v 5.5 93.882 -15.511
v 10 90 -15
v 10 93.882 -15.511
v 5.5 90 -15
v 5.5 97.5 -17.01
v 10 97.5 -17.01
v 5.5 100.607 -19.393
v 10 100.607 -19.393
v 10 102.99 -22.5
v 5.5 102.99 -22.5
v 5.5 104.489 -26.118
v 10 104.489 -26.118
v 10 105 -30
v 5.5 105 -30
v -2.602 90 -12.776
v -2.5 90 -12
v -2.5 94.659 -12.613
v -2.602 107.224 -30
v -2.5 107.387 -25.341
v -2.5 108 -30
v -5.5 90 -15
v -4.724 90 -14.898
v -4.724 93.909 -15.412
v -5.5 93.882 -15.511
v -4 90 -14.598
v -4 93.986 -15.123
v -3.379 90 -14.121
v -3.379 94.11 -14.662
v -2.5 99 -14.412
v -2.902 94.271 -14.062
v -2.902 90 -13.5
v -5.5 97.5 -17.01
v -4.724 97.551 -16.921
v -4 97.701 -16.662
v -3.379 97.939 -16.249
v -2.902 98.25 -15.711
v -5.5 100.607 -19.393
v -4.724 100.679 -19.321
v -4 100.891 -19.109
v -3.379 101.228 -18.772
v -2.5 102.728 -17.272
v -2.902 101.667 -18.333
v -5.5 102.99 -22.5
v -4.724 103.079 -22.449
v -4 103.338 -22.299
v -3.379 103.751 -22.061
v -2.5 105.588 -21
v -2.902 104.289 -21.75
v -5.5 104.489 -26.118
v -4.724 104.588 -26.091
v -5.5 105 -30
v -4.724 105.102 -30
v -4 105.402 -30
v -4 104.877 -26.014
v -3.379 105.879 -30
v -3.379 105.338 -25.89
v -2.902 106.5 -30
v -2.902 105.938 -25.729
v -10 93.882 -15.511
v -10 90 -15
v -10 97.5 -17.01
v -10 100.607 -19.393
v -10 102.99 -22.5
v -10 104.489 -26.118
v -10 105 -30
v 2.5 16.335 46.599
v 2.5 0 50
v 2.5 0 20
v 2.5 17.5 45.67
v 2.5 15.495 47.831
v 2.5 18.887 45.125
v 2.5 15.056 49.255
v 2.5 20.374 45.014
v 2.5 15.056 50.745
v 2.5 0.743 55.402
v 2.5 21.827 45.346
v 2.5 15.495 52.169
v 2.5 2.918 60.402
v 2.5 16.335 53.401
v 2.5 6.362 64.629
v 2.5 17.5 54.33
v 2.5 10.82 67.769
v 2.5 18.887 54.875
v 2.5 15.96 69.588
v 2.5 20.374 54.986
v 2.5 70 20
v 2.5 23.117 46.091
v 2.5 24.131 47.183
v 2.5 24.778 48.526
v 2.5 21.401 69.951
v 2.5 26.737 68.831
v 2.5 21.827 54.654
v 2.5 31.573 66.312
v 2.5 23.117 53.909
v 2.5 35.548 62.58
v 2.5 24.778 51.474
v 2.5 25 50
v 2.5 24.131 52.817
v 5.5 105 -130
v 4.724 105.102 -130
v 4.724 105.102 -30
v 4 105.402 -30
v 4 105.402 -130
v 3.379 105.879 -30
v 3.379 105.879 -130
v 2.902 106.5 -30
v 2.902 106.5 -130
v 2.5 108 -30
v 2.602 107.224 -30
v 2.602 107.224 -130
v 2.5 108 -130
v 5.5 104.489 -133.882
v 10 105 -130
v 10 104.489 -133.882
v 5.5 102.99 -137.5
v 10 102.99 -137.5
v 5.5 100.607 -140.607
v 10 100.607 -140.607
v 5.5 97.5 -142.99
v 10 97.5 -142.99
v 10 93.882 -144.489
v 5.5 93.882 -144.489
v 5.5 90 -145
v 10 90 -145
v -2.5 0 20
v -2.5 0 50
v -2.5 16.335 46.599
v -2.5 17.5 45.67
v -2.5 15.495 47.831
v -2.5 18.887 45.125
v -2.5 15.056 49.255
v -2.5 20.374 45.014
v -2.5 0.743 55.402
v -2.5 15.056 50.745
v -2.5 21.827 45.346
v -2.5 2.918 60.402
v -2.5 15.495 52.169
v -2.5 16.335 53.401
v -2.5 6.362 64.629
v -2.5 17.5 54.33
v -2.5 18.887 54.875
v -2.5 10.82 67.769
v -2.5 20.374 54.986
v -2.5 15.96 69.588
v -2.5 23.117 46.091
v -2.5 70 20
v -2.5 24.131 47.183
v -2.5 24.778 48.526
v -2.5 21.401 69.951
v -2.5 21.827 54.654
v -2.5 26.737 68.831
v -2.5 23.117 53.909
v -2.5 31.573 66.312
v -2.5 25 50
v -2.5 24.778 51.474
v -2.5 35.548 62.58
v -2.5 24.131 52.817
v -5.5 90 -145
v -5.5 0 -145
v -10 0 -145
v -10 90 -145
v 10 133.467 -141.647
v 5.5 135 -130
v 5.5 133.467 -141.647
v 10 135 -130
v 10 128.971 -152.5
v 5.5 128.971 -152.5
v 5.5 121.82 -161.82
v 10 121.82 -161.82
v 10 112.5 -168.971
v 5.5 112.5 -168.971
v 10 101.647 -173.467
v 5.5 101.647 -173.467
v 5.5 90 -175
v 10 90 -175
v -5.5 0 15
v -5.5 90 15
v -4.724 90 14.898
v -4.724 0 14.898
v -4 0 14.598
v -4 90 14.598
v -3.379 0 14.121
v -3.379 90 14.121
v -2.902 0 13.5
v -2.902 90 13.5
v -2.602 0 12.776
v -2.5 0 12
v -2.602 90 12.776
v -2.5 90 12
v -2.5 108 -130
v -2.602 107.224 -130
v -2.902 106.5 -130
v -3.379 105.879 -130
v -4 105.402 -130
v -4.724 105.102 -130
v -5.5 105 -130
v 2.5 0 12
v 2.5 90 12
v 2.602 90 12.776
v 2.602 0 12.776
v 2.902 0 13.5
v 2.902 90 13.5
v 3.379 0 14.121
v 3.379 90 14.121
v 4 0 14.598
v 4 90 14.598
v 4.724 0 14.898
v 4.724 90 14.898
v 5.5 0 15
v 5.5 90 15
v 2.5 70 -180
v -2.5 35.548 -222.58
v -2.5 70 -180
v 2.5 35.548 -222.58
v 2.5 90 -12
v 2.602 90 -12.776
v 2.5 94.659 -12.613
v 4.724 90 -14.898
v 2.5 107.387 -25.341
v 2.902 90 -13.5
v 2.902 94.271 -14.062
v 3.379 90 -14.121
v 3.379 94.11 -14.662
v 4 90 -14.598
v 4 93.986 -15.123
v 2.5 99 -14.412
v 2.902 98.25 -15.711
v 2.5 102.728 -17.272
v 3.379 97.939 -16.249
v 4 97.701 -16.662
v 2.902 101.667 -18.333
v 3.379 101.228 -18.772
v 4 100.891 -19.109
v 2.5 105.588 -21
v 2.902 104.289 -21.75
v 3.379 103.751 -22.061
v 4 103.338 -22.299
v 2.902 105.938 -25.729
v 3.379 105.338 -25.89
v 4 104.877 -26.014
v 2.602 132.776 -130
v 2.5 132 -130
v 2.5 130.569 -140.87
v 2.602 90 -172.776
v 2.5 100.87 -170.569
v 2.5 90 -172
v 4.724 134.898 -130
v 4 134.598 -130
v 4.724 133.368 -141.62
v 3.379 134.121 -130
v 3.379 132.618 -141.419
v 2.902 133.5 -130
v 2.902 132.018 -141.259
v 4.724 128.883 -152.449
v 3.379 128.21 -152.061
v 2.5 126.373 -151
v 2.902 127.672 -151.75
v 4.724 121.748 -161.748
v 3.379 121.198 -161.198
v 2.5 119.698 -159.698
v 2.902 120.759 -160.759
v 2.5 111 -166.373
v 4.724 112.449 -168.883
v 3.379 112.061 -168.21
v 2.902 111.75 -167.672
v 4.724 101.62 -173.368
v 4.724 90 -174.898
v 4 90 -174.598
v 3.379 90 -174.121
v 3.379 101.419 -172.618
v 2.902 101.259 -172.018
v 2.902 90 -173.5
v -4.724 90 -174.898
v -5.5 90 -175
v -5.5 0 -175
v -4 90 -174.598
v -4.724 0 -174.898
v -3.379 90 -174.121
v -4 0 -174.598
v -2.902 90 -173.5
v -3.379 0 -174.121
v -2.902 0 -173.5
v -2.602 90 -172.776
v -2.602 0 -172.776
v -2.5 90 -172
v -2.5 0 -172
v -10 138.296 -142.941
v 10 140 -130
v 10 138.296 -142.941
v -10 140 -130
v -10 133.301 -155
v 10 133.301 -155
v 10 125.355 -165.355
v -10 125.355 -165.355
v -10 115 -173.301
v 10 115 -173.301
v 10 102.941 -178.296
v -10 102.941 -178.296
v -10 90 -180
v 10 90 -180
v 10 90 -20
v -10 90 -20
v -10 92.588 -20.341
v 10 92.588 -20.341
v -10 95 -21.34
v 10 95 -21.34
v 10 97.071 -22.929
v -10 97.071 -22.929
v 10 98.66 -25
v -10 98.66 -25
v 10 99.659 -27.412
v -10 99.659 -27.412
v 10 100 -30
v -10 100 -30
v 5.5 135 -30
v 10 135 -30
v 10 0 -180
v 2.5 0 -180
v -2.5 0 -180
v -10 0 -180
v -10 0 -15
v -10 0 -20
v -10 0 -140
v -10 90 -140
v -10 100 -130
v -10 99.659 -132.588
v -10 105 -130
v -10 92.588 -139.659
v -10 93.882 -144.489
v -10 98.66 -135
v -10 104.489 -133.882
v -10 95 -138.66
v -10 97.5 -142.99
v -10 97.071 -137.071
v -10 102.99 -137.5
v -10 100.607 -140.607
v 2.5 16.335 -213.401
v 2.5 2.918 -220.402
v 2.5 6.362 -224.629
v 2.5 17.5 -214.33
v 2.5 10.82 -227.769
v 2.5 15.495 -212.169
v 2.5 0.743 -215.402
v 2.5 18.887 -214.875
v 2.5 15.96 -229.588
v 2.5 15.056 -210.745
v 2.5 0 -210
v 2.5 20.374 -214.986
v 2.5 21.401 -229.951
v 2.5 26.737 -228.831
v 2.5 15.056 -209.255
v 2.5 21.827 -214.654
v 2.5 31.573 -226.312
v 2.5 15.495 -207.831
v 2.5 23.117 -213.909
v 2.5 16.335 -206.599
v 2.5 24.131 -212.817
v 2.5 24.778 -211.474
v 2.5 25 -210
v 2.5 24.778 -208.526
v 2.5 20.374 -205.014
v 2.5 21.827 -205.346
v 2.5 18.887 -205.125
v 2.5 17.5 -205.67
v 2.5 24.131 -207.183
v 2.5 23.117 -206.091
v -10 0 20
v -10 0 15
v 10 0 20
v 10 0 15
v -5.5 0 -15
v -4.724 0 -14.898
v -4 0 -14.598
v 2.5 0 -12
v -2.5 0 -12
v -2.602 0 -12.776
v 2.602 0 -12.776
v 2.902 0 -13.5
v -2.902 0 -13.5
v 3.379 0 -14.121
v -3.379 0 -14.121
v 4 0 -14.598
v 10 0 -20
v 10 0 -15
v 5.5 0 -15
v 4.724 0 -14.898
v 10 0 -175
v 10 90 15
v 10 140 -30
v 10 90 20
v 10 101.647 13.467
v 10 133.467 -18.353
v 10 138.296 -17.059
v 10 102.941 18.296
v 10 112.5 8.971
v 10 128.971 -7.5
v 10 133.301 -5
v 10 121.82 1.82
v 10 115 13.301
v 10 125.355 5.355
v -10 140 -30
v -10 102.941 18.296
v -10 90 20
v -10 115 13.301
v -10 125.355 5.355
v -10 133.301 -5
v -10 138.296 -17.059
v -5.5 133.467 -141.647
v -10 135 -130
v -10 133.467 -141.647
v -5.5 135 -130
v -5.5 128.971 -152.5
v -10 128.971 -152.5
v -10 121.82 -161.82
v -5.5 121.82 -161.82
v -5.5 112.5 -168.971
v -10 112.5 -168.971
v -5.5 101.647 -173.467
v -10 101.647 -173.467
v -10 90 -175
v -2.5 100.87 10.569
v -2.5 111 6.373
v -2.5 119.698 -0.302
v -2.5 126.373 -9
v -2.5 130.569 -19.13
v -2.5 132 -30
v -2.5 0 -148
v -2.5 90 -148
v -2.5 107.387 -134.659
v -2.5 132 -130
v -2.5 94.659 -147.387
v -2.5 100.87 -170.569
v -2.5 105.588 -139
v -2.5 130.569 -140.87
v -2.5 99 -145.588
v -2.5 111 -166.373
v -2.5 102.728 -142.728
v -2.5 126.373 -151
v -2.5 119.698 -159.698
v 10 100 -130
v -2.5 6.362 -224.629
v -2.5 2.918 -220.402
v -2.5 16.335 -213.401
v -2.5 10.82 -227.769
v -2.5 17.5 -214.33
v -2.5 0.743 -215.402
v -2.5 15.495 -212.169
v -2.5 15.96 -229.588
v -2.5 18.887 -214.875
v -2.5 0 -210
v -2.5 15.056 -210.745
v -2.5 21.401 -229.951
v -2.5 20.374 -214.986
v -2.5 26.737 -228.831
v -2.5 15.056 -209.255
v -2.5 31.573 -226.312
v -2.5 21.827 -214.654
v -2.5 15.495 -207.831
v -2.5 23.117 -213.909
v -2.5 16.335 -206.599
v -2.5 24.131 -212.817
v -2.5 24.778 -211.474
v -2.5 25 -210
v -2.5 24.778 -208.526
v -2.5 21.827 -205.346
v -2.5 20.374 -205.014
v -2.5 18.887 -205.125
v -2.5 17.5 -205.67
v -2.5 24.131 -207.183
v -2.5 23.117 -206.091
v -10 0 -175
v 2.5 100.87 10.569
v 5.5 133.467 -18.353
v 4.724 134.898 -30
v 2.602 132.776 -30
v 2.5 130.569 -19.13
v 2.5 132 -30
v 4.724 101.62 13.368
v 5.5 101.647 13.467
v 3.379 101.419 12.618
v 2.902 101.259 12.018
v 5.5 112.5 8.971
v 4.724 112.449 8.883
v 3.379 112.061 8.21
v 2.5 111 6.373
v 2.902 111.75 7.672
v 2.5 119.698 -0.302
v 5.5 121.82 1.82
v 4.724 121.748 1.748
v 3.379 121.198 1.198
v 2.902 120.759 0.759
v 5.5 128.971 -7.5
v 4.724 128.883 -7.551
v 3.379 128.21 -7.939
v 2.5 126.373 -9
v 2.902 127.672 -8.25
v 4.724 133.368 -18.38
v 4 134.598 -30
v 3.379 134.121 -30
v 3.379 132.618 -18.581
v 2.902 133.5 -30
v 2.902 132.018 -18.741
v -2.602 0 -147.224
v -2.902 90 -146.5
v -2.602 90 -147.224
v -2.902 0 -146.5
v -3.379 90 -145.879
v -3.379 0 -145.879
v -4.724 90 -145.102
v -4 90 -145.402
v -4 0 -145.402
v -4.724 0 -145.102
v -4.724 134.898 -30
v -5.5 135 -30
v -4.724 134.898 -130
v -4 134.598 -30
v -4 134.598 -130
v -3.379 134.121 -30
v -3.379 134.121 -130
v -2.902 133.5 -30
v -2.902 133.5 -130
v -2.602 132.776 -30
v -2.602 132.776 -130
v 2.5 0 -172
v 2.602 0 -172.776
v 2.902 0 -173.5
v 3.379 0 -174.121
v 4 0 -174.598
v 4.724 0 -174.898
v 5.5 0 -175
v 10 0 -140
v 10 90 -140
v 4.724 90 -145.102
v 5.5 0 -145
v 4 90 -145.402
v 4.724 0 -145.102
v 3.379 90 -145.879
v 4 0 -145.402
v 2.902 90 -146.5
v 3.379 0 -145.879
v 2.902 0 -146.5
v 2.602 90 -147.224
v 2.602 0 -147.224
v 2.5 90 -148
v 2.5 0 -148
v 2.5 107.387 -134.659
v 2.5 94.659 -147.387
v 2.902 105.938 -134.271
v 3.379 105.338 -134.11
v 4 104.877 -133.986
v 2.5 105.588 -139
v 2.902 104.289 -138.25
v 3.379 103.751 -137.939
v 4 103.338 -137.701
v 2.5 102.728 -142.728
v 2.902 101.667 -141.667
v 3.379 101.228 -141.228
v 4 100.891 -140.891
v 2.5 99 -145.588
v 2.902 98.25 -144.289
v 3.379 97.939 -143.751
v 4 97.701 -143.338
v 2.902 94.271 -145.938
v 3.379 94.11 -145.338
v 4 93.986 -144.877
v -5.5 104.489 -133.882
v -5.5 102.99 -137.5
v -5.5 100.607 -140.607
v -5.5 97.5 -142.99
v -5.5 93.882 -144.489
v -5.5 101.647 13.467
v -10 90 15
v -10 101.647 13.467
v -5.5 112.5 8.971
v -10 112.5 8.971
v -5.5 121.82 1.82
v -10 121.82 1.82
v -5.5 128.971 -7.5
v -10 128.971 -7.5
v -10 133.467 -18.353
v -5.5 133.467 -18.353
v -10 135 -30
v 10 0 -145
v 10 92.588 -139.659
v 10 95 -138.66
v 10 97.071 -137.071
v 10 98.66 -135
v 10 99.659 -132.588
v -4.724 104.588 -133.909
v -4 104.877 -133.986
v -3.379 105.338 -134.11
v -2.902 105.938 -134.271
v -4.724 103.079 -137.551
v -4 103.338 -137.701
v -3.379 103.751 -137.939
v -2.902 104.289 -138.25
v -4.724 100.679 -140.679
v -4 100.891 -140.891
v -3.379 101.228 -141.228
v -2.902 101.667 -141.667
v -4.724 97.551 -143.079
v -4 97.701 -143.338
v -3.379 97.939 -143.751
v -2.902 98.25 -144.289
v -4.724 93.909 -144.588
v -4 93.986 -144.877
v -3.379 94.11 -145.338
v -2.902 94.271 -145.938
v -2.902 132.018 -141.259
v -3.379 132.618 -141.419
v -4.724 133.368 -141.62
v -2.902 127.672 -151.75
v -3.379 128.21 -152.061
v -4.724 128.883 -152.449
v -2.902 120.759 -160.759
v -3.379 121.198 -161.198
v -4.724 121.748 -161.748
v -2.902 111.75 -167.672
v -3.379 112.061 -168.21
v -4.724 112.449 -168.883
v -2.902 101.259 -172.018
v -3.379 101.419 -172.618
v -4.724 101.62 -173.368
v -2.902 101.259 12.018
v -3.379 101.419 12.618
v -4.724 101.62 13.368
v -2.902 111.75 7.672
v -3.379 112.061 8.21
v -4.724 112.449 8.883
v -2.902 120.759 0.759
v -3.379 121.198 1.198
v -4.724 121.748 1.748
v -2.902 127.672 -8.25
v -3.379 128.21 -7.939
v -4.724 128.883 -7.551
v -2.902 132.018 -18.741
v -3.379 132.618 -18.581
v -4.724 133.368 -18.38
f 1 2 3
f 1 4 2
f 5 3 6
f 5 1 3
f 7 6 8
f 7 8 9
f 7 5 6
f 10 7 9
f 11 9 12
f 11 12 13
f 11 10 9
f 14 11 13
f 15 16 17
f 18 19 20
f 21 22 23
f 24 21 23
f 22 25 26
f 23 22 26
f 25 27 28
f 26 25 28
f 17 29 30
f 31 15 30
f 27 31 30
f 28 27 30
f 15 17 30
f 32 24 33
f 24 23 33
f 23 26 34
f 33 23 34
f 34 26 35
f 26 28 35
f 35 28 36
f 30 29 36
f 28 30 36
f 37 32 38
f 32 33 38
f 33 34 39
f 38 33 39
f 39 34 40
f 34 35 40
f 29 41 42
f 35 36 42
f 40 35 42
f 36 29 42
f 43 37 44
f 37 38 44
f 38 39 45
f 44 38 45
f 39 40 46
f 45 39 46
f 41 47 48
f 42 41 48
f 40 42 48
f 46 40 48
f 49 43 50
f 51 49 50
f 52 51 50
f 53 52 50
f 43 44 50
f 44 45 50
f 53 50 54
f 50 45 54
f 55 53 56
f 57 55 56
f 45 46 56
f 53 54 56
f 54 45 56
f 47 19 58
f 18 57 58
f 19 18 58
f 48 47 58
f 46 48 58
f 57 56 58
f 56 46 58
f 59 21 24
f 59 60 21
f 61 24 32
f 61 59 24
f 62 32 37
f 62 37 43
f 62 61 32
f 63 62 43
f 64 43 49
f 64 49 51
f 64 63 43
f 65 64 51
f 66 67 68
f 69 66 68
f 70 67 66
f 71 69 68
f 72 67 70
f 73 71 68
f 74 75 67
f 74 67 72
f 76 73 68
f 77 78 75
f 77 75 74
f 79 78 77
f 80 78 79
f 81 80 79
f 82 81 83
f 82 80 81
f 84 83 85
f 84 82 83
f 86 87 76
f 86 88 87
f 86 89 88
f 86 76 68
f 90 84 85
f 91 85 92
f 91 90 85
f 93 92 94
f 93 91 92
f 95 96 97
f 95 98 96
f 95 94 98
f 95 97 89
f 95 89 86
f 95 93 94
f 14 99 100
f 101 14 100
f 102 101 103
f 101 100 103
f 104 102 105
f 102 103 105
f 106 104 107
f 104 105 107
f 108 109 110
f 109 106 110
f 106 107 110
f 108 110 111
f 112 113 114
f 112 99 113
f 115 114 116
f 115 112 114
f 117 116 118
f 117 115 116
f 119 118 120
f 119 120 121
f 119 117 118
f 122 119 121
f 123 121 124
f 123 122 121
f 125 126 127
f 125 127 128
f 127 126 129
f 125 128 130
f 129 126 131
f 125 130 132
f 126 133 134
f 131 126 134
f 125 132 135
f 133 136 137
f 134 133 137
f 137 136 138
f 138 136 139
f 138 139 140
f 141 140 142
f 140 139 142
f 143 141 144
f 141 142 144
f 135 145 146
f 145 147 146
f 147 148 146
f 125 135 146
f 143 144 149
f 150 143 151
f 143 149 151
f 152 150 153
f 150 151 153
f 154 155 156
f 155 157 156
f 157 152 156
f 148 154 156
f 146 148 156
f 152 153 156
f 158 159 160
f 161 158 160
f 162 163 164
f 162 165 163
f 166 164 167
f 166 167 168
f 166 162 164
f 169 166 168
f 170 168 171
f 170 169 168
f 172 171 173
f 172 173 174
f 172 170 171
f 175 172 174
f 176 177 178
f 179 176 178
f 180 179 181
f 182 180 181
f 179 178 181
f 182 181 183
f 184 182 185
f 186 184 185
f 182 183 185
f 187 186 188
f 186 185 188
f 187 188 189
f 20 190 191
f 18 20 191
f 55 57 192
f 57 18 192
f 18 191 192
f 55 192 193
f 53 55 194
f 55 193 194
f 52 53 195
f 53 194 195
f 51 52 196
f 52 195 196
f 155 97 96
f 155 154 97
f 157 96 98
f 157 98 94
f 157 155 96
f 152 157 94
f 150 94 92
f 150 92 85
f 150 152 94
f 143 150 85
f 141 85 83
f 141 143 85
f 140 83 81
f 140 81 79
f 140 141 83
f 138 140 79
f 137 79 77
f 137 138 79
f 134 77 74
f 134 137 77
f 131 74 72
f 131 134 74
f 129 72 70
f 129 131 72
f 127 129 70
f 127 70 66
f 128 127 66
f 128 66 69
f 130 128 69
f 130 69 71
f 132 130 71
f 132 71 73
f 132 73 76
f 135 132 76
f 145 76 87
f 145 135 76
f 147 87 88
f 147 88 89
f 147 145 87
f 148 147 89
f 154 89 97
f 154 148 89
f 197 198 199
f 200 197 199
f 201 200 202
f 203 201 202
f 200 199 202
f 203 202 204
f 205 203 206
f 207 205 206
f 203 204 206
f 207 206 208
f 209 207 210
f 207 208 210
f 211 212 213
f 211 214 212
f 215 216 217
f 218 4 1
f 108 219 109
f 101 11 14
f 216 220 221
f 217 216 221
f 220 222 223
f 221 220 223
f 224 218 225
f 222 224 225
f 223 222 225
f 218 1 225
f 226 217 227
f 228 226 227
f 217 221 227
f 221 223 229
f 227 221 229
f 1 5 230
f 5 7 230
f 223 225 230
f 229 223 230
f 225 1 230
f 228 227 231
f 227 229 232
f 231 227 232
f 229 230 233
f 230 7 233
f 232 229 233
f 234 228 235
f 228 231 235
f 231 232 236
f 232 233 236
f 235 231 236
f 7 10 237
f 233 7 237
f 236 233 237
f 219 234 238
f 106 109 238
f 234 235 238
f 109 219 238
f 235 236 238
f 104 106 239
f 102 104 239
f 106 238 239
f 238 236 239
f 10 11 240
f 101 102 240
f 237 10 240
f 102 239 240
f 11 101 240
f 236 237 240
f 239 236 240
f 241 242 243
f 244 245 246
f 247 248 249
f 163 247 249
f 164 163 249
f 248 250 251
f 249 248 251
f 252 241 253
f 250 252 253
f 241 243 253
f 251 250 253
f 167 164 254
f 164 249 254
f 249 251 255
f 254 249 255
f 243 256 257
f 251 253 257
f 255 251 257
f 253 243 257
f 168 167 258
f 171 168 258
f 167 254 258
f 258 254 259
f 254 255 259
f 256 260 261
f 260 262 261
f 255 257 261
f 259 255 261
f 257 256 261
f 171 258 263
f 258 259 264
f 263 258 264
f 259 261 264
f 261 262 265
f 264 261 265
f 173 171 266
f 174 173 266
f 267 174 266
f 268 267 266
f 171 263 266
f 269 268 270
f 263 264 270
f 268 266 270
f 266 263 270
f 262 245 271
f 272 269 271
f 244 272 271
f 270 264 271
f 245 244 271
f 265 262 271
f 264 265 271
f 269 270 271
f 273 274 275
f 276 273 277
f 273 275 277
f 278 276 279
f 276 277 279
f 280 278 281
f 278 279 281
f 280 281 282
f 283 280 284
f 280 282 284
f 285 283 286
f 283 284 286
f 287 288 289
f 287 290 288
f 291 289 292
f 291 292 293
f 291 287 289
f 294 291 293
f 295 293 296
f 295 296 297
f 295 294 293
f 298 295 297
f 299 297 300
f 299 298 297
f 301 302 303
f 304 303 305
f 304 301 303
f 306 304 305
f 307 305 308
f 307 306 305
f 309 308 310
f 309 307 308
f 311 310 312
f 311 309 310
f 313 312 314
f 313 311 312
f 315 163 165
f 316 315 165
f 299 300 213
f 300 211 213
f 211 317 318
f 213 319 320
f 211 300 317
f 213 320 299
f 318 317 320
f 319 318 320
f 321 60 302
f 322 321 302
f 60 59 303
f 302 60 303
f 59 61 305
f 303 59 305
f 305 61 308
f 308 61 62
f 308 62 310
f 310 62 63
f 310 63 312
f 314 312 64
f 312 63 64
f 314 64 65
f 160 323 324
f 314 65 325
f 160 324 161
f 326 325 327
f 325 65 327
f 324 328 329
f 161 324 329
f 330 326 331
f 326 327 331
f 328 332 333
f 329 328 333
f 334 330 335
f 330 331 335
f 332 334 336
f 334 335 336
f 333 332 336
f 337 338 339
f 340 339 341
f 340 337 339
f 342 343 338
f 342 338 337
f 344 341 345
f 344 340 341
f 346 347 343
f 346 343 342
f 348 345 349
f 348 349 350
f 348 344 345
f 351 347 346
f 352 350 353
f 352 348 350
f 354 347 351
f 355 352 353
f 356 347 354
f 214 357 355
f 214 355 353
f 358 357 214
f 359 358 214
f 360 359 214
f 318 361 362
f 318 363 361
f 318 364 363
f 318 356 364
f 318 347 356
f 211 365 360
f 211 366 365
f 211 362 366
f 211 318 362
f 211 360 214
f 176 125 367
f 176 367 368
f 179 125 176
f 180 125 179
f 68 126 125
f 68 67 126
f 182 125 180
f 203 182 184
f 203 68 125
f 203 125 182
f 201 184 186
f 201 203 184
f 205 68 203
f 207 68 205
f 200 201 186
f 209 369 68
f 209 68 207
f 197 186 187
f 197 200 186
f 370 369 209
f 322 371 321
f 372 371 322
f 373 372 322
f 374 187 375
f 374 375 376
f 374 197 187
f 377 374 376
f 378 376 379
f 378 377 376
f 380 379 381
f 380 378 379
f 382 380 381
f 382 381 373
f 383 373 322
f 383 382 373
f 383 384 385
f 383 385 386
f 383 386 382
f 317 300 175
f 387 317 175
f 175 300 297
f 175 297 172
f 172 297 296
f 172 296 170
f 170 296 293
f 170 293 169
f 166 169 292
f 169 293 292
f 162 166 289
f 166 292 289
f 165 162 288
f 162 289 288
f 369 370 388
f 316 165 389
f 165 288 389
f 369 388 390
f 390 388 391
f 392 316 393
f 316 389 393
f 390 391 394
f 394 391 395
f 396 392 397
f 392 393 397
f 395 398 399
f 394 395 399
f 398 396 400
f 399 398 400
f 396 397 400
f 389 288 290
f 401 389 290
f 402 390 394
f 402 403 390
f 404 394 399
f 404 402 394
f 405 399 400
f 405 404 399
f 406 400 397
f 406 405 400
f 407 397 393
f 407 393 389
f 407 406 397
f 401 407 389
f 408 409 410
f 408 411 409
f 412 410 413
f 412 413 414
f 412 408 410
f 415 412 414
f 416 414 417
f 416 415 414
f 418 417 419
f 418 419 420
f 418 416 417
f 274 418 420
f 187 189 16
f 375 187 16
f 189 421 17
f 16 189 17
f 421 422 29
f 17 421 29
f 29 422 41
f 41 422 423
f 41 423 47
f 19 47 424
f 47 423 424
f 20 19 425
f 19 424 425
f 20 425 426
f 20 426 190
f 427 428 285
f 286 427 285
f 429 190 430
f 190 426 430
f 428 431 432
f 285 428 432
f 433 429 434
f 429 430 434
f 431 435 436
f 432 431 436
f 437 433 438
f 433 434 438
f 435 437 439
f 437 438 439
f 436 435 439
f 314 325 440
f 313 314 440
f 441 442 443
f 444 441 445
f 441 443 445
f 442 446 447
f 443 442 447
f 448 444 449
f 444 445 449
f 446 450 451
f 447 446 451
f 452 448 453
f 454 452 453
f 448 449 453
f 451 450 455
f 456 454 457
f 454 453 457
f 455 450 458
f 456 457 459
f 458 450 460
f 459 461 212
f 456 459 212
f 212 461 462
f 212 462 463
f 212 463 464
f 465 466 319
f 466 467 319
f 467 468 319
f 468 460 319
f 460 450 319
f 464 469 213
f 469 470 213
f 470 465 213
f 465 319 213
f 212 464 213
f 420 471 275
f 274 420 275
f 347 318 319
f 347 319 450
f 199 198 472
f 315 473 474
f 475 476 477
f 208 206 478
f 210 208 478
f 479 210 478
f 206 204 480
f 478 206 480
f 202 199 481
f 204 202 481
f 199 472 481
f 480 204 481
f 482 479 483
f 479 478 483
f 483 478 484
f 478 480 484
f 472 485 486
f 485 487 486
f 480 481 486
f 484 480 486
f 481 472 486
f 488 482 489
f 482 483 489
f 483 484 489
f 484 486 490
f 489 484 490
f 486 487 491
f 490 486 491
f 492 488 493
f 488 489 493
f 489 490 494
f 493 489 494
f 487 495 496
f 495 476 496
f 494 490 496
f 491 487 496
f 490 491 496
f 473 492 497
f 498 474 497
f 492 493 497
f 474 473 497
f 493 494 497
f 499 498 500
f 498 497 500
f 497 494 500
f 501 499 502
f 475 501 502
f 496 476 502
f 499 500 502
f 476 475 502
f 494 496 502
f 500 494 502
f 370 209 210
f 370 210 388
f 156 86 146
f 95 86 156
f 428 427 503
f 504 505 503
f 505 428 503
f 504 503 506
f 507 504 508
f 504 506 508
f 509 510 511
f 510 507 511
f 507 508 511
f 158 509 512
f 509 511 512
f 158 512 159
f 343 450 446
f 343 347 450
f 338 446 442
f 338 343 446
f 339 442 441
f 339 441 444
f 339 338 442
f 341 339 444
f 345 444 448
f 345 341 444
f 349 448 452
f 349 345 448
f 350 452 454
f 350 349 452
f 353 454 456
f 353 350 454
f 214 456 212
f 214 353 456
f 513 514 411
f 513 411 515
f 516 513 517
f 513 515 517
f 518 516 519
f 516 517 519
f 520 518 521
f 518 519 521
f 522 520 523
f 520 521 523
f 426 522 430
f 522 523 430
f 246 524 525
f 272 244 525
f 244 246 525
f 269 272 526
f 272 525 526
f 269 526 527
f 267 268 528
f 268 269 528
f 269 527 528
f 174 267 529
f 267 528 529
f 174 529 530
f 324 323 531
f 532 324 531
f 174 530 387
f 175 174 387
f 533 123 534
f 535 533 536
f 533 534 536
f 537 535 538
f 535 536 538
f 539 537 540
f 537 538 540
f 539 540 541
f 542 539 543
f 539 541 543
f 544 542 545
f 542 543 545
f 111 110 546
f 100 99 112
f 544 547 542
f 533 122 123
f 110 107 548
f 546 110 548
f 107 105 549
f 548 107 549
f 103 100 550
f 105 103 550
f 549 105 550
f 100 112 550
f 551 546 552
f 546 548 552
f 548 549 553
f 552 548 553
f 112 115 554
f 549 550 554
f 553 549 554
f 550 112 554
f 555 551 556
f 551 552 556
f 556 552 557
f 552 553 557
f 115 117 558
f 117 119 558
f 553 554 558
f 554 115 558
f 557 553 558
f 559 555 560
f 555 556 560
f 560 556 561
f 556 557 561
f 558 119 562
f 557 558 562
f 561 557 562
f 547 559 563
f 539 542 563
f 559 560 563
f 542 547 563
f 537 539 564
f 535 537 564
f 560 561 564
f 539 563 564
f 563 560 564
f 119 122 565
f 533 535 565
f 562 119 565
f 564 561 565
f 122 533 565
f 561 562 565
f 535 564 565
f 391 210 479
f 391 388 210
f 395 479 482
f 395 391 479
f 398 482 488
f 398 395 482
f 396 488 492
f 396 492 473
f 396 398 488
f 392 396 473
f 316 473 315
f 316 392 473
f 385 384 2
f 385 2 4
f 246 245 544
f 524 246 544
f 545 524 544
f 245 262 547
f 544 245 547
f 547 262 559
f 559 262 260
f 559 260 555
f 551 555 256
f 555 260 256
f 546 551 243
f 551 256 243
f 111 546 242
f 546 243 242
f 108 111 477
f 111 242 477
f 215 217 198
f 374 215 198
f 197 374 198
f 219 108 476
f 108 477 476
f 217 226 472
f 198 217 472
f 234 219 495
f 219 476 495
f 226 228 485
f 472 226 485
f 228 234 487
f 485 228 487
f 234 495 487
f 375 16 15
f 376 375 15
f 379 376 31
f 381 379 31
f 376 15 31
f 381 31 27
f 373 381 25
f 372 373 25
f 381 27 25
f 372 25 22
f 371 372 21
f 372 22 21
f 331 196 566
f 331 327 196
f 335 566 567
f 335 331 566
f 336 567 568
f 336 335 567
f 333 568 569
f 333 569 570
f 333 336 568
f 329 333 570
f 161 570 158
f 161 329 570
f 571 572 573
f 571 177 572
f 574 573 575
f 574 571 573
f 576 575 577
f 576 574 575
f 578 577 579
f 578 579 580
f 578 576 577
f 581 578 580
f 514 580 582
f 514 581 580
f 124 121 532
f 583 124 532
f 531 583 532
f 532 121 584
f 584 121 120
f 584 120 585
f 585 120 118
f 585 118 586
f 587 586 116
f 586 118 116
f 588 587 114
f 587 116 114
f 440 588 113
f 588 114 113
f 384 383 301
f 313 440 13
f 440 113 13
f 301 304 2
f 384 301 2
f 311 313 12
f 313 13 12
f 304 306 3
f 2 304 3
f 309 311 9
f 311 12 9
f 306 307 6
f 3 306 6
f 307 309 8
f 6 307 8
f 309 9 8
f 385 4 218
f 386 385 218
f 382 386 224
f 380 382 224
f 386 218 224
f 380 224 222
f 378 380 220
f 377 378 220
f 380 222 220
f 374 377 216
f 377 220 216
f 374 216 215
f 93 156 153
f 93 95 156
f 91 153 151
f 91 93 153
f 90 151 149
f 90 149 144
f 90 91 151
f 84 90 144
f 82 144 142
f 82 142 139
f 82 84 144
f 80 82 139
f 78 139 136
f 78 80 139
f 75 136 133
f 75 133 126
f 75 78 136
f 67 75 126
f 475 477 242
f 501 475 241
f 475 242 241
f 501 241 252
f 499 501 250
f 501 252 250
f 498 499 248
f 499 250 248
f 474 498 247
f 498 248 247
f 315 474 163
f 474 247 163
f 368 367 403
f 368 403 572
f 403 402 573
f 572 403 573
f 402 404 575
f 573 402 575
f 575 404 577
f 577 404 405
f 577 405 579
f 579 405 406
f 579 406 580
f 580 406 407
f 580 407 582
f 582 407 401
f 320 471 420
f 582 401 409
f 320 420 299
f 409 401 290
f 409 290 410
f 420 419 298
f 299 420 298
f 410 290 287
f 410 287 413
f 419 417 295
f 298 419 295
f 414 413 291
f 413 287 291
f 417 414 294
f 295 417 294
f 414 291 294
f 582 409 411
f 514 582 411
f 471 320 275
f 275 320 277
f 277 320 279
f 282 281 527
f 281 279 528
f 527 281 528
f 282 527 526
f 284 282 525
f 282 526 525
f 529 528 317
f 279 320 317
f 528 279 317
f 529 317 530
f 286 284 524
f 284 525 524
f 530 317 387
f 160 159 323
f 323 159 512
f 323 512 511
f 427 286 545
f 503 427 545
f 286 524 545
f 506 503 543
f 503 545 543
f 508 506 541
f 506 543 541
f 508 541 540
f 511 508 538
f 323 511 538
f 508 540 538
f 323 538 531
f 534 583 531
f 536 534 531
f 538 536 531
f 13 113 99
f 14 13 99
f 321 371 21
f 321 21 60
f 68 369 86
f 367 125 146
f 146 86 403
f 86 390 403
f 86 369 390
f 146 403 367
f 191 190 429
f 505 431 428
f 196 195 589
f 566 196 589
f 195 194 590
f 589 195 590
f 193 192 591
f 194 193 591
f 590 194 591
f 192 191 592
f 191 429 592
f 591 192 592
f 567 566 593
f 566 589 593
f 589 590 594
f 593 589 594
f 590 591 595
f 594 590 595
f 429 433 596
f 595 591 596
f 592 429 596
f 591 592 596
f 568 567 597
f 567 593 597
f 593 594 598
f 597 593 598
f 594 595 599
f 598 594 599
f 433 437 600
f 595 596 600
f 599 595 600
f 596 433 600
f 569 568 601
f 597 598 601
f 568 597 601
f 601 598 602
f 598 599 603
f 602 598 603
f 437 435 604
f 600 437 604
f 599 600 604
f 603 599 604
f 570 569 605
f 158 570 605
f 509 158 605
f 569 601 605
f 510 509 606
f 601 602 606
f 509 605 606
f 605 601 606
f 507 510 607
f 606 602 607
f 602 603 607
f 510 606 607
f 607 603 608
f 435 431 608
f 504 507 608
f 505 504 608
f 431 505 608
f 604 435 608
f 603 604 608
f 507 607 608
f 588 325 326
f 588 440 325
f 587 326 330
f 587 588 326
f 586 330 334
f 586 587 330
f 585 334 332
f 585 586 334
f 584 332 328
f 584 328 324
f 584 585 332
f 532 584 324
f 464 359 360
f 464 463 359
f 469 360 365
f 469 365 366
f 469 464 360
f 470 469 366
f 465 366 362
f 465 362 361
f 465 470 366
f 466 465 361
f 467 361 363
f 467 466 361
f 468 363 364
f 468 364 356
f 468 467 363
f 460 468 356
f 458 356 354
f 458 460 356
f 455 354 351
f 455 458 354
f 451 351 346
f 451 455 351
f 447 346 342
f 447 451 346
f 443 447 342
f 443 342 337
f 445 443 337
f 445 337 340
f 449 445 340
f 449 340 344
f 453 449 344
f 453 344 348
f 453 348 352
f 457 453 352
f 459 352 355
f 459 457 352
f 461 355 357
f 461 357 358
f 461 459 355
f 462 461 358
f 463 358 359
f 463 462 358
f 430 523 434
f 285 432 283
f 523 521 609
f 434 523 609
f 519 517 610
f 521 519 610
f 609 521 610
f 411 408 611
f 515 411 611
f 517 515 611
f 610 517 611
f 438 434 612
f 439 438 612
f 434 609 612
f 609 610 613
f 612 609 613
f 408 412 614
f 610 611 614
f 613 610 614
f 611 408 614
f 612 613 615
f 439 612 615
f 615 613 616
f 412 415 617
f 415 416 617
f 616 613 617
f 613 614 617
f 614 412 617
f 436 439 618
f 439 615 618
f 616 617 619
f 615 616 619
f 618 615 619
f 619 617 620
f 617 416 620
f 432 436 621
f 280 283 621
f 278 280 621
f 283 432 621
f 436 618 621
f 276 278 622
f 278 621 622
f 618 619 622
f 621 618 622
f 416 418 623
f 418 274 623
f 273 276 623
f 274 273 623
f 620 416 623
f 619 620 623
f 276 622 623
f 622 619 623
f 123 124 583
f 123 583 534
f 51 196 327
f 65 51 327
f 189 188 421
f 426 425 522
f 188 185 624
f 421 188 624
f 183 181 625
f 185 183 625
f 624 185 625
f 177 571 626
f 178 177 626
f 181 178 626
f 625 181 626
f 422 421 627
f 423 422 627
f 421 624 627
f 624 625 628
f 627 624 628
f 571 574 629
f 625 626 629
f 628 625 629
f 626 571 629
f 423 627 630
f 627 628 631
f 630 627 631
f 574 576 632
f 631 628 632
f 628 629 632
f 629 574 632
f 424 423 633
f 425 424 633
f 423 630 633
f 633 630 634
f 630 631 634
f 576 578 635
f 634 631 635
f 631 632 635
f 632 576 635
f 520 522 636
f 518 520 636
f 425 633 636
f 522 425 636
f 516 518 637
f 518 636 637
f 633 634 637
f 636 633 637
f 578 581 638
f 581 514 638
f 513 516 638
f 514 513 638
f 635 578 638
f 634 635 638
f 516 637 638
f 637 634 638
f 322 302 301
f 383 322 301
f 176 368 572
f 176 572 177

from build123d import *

# Parameters (mm, degrees)
F4_R     = 5
F5_DEPTH = 2.5
F6_DEPTH = 2.5


with BuildPart() as f2:
    # F2: sweep along a path in F1
    with BuildLine(Plane.YZ) as f2_path:
        Line((0, -20), (90, -20))
        ThreePointArc((90, -20), (97.071068, -22.928932), (100, -30))
        Line((100, -30), (100, -80))
        Line((100, -80), (100, -130))
        ThreePointArc((100, -130), (97.071068, -137.071068), (90, -140))
        Line((90, -140), (0, -140))
    # F0 (on Front) → F2 (sweep)
    with BuildSketch(Plane.XZ):
        with BuildLine():
            Line((2.5, -12), (2.5, 0))
            Line((2.5, 0), (2.5, 12))
            ThreePointArc((2.5, 12), (3.37868, 14.12132), (5.5, 15))
            Line((5.5, 15), (10, 15))
            Line((10, 15), (10, 20))
            Line((10, 20), (0, 20))
            Line((0, 20), (-10, 20))
            Line((-10, 20), (-10, 15))
            Line((-10, 15), (-5.5, 15))
            ThreePointArc((-5.5, 15), (-3.37868, 14.12132), (-2.5, 12))
            Line((-2.5, 12), (-2.5, 0))
            Line((-2.5, 0), (-2.5, -12))
            ThreePointArc((-2.5, -12), (-3.37868, -14.12132), (-5.5, -15))
            Line((-5.5, -15), (-10, -15))
            Line((-10, -15), (-10, -20))
            Line((-10, -20), (0, -20))
            Line((0, -20), (10, -20))
            Line((10, -20), (10, -15))
            Line((10, -15), (5.5, -15))
            ThreePointArc((5.5, -15), (3.37868, -14.12132), (2.5, -12))
        make_face()
    sweep(path=f2_path.line)

    # F4 (on Right) → F5 (join, symmetric)
    with BuildSketch(Plane.YZ):
        with BuildLine():
            Line((0, 50), (0, 20))
            Line((0, 20), (70, 20))
            Line((70, 20), (35.548045, 62.580075))
            ThreePointArc((35.548045, 62.580075), (13.327703, 68.854189), (0, 50))
        make_face()
        with Locations((20, 50)):
            Circle(F4_R, mode=Mode.SUBTRACT)
    extrude(amount=F5_DEPTH, both=True)

    # F4 (on Right) → F6 (join, symmetric)
    with BuildSketch(Plane.YZ):
        with BuildLine():
            Line((0, 50), (0, 20))
            Line((0, 20), (70, 20))
            Line((70, 20), (35.548045, 62.580075))
            ThreePointArc((35.548045, 62.580075), (13.327703, 68.854189), (0, 50))
        make_face()
        with Locations((20, 50)):
            Circle(F4_R, mode=Mode.SUBTRACT)
        with BuildLine():
            Line((35.548045, -222.580075), (70, -180))
            Line((70, -180), (0, -180))
            Line((0, -180), (0, -210))
            ThreePointArc((0, -210), (13.327703, -228.854189), (35.548045, -222.580075))
        make_face()
        with Locations((20, -210)):
            Circle(F4_R, mode=Mode.SUBTRACT)
    extrude(amount=F6_DEPTH, both=True)


solid = f2.part
